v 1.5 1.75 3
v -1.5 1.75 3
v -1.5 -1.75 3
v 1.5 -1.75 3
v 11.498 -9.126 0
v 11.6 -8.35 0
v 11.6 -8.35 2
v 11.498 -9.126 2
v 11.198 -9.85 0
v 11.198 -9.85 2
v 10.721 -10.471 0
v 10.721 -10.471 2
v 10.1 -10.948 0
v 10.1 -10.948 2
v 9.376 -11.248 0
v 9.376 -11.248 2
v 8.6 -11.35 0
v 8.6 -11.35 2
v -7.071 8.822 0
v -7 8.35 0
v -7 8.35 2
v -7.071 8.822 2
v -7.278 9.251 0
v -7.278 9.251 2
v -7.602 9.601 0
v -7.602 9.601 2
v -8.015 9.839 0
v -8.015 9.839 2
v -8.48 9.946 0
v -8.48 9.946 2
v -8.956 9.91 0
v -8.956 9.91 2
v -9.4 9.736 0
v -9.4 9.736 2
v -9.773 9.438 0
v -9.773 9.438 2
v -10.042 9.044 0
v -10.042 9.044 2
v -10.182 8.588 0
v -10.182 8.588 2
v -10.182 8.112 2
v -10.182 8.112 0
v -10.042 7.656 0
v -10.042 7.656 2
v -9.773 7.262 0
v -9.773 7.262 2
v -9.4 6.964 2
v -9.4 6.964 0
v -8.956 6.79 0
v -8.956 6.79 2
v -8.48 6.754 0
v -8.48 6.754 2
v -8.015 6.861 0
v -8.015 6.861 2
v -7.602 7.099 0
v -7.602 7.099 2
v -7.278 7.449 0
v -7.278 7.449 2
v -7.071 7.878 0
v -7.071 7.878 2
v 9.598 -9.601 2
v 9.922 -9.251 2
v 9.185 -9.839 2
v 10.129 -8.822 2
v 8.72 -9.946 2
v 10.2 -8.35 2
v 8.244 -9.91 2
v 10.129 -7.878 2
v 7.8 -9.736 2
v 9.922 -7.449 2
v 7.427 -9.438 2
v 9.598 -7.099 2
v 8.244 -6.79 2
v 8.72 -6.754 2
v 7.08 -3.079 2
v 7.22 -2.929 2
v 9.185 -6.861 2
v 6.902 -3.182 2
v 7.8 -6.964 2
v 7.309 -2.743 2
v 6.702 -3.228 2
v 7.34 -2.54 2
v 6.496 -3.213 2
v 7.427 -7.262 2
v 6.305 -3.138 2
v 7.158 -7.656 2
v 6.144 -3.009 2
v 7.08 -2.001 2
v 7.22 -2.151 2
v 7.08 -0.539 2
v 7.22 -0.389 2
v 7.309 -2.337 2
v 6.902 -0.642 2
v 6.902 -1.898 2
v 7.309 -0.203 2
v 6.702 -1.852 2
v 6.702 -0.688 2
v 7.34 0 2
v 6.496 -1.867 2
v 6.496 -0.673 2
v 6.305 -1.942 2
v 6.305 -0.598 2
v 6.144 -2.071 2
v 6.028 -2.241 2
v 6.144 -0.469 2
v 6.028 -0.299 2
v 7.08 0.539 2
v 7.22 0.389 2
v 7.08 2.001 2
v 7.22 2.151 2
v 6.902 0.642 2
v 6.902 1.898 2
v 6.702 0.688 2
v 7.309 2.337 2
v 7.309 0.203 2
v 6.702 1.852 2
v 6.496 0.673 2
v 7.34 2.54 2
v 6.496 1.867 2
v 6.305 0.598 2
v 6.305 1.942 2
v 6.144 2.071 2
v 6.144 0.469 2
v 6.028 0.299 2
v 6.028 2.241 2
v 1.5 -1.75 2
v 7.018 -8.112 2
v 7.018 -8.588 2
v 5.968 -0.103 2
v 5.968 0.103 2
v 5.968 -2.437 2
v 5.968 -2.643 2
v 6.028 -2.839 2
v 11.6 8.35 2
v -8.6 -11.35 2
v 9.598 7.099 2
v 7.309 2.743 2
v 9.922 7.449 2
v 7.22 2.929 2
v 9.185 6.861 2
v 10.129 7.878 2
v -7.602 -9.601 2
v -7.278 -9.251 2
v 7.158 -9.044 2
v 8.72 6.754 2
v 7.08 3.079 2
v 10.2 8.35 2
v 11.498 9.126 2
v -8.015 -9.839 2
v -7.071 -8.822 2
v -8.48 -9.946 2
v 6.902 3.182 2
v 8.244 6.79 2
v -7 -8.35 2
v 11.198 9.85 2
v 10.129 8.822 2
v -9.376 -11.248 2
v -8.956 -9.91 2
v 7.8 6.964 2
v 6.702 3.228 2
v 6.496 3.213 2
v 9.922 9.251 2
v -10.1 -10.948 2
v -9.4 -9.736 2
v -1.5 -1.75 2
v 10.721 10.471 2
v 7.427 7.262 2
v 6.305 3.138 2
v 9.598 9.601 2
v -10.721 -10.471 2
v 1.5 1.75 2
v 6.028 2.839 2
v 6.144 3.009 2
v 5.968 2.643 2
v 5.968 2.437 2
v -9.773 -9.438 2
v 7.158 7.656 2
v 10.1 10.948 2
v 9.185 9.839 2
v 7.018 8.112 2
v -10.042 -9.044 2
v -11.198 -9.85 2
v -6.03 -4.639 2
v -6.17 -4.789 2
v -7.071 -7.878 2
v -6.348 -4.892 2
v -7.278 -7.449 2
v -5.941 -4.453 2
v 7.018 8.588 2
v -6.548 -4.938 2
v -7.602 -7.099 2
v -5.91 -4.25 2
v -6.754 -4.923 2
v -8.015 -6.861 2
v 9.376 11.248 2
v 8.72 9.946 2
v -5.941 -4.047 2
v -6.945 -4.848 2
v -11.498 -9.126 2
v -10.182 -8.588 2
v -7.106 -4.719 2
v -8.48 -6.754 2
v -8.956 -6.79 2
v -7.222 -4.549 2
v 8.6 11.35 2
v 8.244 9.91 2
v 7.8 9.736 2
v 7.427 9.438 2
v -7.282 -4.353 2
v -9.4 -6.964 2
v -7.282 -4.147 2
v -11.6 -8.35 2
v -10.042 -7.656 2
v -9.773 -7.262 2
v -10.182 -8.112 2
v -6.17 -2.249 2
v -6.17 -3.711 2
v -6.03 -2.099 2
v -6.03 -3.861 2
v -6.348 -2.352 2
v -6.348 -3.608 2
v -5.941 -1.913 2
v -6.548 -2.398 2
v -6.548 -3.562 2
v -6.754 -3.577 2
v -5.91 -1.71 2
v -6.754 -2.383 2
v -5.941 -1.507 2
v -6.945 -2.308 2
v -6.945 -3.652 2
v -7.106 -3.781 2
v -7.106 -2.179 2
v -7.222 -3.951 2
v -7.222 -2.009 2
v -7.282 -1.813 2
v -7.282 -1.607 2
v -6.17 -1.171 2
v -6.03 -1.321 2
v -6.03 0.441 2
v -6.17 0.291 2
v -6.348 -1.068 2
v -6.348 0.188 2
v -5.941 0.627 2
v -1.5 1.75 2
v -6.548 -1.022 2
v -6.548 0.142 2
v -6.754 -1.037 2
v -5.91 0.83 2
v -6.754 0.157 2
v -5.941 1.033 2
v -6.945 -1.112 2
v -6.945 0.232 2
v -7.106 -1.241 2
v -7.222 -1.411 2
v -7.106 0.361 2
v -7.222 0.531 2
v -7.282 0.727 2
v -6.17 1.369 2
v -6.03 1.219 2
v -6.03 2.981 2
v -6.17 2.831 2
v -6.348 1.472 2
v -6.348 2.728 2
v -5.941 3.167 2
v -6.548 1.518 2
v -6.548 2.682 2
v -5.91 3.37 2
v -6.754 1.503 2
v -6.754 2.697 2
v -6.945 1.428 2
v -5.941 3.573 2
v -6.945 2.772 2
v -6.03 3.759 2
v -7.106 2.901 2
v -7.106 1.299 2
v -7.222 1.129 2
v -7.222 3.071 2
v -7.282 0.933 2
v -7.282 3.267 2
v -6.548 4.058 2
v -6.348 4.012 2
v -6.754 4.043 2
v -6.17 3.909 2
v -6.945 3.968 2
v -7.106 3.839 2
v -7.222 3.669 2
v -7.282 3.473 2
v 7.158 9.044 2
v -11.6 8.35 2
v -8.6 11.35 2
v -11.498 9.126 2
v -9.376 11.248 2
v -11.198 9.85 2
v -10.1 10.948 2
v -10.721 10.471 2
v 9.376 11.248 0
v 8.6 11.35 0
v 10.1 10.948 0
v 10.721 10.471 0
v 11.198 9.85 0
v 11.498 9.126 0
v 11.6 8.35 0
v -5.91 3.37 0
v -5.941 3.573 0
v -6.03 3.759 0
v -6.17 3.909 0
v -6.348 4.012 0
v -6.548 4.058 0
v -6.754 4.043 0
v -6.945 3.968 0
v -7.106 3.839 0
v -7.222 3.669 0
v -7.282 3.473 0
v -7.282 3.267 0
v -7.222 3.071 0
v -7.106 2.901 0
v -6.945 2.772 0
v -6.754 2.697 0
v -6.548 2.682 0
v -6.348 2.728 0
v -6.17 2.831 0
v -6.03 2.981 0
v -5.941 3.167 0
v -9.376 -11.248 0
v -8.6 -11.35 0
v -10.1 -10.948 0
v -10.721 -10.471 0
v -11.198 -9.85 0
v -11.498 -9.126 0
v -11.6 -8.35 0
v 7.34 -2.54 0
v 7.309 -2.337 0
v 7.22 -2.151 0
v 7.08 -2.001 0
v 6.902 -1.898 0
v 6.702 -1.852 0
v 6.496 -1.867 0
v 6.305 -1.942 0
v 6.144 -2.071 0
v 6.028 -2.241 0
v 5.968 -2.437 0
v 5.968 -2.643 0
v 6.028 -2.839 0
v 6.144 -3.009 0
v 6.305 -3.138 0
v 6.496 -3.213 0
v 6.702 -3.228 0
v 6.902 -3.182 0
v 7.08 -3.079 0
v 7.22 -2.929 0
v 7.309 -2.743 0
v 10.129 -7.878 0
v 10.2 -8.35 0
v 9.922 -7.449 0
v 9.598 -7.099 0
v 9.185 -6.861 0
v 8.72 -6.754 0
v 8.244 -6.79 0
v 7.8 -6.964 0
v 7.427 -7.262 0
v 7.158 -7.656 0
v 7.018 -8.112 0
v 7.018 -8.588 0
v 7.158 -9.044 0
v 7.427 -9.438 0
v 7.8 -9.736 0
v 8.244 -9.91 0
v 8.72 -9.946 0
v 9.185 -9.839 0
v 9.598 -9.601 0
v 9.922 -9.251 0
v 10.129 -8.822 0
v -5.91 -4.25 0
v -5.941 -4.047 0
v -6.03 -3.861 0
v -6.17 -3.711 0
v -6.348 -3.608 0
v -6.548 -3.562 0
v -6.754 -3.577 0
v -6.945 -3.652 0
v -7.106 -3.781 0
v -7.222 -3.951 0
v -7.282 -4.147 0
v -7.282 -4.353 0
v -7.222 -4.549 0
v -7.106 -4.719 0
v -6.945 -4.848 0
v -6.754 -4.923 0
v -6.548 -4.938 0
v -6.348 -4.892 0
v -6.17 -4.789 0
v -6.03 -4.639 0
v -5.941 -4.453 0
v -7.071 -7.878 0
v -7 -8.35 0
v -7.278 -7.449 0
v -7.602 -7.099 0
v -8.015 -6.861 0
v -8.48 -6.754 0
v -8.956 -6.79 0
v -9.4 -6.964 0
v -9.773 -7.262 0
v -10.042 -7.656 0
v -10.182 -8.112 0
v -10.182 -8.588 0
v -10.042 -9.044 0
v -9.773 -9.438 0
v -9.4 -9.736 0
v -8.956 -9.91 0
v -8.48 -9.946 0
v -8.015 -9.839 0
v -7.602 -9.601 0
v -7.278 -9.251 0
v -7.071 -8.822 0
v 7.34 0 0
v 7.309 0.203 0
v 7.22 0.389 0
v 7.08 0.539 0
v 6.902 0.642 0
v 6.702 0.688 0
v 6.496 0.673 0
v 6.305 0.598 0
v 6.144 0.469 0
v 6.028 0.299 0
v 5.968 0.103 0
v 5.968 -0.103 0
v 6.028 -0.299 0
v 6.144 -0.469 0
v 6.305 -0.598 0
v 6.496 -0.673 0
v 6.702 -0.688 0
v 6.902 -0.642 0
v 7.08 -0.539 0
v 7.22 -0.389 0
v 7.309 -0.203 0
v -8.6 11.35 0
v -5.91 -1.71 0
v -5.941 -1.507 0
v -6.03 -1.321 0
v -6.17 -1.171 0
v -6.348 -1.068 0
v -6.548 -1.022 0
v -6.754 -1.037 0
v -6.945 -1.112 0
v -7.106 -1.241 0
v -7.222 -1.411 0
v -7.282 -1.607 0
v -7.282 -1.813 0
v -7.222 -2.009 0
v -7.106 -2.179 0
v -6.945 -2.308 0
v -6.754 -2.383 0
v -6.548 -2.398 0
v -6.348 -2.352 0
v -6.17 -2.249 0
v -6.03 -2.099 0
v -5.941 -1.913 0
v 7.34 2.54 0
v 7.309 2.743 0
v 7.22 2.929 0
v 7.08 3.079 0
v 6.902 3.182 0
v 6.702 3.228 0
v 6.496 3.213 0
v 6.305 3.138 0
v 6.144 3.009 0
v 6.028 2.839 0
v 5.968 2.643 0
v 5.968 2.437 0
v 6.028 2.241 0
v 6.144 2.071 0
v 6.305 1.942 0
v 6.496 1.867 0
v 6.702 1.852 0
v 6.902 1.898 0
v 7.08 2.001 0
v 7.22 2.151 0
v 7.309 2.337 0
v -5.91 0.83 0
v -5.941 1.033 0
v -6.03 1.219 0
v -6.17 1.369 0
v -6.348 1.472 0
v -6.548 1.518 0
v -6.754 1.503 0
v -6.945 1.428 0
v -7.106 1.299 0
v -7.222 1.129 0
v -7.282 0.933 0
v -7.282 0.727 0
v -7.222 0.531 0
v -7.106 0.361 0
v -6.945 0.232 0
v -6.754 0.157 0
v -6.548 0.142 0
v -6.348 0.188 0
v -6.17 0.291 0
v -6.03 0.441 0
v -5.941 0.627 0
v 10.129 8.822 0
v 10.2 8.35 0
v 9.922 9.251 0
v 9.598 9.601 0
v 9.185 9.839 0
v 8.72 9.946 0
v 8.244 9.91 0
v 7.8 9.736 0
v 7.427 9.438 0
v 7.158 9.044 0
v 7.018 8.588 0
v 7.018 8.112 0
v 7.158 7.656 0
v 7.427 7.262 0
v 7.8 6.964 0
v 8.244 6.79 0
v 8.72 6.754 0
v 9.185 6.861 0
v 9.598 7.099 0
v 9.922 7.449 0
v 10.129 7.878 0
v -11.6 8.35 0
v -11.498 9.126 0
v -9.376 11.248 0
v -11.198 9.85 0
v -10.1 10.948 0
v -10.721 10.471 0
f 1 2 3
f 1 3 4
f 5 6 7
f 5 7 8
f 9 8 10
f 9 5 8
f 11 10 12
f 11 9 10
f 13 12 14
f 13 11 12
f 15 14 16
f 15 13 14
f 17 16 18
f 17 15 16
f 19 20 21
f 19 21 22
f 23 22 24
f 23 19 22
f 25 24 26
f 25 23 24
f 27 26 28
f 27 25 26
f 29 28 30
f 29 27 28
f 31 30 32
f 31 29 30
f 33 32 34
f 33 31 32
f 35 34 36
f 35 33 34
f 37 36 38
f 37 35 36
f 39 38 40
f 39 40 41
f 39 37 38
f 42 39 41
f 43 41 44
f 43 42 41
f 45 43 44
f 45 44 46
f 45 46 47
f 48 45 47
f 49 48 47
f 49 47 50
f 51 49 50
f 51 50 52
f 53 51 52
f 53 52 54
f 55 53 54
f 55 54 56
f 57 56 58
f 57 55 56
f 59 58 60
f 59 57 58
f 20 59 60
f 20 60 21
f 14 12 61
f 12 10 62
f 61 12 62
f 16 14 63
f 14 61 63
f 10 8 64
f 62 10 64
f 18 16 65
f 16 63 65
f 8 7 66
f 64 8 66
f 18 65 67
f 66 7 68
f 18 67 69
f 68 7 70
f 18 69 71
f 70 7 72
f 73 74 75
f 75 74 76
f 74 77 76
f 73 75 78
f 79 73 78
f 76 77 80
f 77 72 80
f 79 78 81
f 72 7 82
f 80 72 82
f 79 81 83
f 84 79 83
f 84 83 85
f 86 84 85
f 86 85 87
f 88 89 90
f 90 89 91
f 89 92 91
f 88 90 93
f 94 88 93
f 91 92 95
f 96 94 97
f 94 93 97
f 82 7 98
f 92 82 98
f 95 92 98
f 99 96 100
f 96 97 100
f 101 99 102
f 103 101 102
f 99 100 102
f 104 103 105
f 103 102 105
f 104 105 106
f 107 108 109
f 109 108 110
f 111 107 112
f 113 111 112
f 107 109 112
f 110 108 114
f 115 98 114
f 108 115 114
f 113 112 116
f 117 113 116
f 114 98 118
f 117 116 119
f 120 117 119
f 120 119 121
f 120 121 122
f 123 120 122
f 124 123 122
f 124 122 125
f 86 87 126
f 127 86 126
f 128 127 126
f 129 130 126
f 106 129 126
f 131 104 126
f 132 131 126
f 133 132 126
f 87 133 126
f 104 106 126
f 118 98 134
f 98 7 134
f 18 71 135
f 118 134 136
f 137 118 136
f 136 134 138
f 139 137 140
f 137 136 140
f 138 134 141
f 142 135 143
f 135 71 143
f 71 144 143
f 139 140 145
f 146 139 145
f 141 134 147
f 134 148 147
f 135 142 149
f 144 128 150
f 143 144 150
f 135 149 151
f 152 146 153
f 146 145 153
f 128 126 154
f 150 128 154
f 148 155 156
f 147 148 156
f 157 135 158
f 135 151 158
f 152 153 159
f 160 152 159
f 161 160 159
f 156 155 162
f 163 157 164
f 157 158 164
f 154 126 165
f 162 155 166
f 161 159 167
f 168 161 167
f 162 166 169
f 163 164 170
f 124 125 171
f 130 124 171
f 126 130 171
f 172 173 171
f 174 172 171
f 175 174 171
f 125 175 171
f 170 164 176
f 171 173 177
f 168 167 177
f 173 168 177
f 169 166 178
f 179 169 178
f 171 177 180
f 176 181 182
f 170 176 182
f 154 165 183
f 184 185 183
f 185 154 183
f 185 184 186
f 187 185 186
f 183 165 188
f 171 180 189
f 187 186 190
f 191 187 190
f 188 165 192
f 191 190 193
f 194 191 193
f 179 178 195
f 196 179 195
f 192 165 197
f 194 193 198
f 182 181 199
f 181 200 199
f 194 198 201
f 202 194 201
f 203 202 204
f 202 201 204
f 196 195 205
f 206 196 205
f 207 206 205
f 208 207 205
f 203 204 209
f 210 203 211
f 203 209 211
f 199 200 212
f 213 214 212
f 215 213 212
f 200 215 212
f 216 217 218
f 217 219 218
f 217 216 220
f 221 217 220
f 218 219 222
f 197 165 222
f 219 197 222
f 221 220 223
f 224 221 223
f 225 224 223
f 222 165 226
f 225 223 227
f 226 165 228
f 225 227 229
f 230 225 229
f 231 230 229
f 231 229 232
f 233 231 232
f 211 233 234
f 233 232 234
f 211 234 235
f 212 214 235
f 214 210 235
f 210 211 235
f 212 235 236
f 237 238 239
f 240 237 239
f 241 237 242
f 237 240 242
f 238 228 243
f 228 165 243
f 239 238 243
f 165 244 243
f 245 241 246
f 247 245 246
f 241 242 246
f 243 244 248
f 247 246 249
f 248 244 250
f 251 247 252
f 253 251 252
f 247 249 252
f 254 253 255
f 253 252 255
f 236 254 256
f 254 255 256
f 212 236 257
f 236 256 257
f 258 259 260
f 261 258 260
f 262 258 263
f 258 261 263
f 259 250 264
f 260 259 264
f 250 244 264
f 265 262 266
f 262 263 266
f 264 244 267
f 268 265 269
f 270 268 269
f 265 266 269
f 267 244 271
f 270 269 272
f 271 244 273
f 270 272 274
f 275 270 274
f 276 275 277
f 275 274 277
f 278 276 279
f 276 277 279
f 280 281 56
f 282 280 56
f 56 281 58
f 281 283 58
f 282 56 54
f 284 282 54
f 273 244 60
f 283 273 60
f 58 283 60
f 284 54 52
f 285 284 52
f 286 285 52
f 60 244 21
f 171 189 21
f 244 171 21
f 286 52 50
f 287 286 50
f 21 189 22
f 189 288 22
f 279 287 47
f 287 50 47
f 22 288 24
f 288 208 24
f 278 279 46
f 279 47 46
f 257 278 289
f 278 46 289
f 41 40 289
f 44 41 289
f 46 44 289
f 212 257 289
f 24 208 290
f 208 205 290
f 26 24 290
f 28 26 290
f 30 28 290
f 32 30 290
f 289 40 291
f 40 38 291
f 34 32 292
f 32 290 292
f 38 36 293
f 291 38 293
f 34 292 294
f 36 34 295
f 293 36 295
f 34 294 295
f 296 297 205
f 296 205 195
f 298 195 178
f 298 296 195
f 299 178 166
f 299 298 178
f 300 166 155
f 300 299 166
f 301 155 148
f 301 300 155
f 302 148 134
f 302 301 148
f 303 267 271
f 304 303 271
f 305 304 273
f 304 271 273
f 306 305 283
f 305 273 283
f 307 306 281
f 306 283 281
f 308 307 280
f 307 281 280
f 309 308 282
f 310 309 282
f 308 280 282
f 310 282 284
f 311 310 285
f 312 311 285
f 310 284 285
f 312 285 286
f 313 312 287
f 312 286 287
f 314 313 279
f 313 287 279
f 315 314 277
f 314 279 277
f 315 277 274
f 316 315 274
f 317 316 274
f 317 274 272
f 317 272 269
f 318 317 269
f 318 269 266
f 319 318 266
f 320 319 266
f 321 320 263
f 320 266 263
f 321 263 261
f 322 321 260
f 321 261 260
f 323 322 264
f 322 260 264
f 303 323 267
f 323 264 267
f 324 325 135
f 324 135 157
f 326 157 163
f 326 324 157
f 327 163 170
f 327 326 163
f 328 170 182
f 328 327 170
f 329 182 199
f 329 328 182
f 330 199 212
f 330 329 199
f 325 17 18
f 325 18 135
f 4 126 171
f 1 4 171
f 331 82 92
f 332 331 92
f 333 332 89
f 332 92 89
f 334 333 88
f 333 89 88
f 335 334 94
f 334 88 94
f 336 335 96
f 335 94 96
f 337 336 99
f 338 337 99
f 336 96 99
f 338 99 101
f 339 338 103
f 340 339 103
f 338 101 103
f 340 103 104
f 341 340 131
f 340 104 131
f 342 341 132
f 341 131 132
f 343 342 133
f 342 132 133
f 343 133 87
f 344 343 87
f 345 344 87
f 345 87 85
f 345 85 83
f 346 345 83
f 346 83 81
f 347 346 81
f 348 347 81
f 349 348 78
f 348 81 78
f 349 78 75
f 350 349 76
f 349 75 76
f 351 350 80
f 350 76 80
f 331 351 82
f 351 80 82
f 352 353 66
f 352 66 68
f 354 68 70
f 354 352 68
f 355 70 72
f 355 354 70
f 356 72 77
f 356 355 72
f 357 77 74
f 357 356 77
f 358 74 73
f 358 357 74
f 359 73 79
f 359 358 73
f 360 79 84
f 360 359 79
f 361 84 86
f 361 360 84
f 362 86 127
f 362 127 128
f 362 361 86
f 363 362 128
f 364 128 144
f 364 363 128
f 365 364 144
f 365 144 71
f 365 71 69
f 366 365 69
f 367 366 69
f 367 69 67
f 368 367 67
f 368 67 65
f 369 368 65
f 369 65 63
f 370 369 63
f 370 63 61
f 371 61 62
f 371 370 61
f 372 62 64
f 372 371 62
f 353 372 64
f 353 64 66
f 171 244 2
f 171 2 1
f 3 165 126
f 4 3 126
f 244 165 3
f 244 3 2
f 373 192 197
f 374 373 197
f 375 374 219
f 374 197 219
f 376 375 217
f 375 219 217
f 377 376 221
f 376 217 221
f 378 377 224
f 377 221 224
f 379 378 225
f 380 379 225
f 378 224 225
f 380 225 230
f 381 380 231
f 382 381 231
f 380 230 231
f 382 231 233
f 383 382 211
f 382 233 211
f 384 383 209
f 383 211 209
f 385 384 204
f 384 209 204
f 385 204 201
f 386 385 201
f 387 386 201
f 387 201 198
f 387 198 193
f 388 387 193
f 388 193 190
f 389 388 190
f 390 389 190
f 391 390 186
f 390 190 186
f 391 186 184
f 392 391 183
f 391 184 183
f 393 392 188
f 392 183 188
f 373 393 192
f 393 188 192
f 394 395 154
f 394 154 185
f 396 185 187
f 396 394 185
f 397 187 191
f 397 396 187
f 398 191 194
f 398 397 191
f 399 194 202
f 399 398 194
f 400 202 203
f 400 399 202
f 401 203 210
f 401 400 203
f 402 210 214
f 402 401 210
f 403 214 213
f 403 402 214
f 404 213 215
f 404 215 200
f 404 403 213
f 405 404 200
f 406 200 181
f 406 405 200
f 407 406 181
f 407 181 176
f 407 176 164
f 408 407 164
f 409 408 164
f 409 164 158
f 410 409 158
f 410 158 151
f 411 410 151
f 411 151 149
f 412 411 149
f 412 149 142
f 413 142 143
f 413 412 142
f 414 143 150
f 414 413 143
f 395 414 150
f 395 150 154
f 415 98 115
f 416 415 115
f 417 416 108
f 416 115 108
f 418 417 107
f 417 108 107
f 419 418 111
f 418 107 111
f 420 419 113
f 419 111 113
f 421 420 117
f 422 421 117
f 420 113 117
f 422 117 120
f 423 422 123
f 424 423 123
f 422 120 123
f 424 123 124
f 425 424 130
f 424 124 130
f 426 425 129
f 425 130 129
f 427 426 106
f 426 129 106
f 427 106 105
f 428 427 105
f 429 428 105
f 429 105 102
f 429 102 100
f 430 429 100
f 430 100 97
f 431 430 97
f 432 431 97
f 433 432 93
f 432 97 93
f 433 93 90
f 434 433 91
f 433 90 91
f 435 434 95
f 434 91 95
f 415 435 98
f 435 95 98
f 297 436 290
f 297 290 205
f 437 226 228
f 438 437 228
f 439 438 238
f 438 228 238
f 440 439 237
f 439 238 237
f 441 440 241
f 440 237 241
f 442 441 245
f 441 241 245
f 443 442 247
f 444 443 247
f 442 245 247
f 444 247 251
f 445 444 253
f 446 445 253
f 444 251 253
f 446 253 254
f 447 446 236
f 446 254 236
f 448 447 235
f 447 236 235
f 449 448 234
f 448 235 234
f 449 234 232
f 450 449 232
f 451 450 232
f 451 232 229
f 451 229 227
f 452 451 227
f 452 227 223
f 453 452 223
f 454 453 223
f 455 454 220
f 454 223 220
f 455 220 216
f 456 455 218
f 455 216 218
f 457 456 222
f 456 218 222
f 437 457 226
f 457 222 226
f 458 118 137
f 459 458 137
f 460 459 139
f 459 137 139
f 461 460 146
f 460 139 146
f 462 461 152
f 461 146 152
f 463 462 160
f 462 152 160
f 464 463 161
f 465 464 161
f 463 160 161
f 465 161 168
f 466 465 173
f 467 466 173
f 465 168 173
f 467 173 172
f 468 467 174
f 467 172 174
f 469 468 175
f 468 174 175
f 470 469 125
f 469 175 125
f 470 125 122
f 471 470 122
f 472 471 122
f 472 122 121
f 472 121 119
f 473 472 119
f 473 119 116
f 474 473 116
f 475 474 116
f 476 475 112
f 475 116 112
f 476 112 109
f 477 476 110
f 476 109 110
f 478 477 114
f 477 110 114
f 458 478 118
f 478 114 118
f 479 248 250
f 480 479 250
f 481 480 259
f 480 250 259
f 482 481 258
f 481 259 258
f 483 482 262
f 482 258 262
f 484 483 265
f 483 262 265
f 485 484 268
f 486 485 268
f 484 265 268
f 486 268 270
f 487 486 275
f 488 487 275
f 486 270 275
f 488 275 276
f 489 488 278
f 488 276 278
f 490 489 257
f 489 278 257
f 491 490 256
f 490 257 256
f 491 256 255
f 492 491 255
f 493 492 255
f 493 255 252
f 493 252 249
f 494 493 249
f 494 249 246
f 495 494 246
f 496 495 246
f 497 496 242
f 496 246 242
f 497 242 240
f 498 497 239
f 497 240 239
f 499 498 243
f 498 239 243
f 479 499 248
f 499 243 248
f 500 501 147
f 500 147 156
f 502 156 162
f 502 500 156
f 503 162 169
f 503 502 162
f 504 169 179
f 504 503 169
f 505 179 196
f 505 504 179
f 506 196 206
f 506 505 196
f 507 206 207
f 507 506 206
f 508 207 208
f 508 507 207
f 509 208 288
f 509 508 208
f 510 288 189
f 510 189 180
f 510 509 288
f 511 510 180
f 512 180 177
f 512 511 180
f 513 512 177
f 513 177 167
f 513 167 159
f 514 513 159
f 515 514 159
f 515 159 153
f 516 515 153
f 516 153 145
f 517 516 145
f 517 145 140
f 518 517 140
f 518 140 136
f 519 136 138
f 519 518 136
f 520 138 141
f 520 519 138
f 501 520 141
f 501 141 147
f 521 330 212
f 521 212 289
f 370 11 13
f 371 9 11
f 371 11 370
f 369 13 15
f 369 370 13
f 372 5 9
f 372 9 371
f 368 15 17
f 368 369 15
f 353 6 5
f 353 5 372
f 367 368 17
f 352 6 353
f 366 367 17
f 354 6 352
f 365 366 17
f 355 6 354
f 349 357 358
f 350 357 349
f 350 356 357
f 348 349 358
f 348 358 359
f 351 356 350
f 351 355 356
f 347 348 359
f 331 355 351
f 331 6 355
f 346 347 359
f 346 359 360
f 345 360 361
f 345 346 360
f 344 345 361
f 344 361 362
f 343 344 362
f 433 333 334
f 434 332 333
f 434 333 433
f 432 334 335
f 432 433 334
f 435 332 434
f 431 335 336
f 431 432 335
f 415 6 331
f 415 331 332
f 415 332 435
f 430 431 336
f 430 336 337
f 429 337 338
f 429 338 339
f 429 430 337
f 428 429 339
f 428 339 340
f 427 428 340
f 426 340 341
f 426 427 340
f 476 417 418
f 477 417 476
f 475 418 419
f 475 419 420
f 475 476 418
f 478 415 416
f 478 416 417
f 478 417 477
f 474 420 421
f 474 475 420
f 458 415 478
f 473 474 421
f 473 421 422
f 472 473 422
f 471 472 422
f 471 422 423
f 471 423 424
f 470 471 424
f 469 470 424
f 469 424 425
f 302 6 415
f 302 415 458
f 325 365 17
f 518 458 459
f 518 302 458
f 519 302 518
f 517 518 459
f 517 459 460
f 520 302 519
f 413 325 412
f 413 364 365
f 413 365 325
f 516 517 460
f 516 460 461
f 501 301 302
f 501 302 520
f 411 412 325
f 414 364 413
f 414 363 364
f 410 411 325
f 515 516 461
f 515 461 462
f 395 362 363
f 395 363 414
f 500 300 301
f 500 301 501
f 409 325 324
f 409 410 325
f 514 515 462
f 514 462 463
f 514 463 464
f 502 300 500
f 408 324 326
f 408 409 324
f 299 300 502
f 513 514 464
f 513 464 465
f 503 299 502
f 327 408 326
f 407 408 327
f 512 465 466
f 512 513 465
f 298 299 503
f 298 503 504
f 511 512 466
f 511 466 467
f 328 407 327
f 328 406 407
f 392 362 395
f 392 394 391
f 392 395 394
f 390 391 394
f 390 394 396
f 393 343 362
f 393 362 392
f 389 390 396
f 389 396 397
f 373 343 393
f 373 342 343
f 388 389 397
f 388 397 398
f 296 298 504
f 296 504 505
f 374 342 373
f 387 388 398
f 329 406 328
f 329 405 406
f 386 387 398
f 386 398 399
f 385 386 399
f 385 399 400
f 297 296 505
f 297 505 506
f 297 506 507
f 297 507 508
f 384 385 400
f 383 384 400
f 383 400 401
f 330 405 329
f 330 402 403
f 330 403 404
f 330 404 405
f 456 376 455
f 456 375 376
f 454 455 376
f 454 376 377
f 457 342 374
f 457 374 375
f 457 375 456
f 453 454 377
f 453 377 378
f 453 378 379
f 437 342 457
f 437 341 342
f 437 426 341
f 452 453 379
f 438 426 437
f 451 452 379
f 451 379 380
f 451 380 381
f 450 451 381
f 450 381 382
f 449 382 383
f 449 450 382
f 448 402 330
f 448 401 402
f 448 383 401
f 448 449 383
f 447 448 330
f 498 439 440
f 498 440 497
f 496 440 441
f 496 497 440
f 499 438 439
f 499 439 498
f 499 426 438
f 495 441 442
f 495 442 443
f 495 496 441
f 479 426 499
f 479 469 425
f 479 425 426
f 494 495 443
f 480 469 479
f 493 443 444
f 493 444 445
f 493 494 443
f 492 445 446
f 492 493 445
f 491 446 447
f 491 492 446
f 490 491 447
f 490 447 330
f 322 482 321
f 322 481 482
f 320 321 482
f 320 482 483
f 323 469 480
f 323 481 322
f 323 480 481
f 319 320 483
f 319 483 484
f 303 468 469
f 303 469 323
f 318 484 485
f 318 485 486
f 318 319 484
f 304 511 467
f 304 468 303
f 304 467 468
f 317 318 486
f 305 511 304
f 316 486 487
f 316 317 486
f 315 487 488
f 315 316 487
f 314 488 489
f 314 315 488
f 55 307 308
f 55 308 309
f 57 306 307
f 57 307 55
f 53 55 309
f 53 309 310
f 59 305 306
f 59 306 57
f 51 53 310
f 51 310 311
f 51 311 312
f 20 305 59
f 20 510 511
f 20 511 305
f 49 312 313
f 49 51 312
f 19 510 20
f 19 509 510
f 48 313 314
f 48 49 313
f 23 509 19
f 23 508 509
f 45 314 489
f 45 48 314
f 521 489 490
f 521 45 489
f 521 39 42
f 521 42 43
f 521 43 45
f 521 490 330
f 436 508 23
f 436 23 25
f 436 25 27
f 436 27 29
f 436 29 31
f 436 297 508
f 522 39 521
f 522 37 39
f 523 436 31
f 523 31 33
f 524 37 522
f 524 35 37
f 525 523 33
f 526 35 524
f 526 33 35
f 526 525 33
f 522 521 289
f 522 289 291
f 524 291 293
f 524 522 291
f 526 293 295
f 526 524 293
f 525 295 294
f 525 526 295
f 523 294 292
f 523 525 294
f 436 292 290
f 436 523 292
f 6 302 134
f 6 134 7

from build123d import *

# Parameters (mm, degrees)
ESBO_O2_R                = 1.6
RESSALTO_EXTRUS_O1_DEPTH = 2
ESBO_O3_R                = 0.69
CORTE_EXTRUS_O1_DEPTH    = 2
ESBO_O4_W                = 3
ESBO_O4_H                = 3.5
RESSALTO_EXTRUS_O2_DEPTH = 1


with BuildPart() as part:
    # Esboço2 → Ressalto-extrusão1 (new body)
    with BuildSketch(Plane.XY):
        with BuildLine():
            Line((8.6, -11.35), (-8.6, -11.35))
            ThreePointArc((-8.6, -11.35), (-10.721320344, -10.471320344), (-11.6, -8.35))
            Line((-11.6, -8.35), (-11.6, 8.35))
            ThreePointArc((-11.6, 8.35), (-10.721320344, 10.471320344), (-8.6, 11.35))
            Line((-8.6, 11.35), (8.6, 11.35))
            ThreePointArc((8.6, 11.35), (10.721320344, 10.471320344), (11.6, 8.35))
            Line((11.6, 8.35), (11.6, -8.35))
            ThreePointArc((11.6, -8.35), (10.721320344, -10.471320344), (8.6, -11.35))
        make_face()
        with Locations((-8.6, -8.35)):
            Circle(ESBO_O2_R, mode=Mode.SUBTRACT)
        with Locations((-8.6, 8.35)):
            Circle(ESBO_O2_R, mode=Mode.SUBTRACT)
        with Locations((8.6, 8.35)):
            Circle(ESBO_O2_R, mode=Mode.SUBTRACT)
        with Locations((8.6, -8.35)):
            Circle(ESBO_O2_R, mode=Mode.SUBTRACT)
    extrude(amount=RESSALTO_EXTRUS_O1_DEPTH)

    # Esboço3 → Corte-extrusão1 (cut)
    with BuildSketch(Plane.XY.offset(2)):
        with Locations((-6.6, -4.25)):
            Circle(ESBO_O3_R)
        with Locations((-6.6, -1.71)):
            Circle(ESBO_O3_R)
        with Locations((-6.6, 0.83)):
            Circle(ESBO_O3_R)
        with Locations((-6.6, 3.37)):
            Circle(ESBO_O3_R)
        with Locations((6.65, 0)):
            Circle(ESBO_O3_R)
        with Locations((6.65, 2.54)):
            Circle(ESBO_O3_R)
        with Locations((6.65, -2.54)):
            Circle(ESBO_O3_R)
    extrude(amount=-CORTE_EXTRUS_O1_DEPTH, mode=Mode.SUBTRACT)

    # Esboço4 → Ressalto-extrusão2 (add)
    with BuildSketch(Plane.XY.offset(2)):
        Rectangle(ESBO_O4_W, ESBO_O4_H)
    extrude(amount=RESSALTO_EXTRUS_O2_DEPTH)


solid = part.part
